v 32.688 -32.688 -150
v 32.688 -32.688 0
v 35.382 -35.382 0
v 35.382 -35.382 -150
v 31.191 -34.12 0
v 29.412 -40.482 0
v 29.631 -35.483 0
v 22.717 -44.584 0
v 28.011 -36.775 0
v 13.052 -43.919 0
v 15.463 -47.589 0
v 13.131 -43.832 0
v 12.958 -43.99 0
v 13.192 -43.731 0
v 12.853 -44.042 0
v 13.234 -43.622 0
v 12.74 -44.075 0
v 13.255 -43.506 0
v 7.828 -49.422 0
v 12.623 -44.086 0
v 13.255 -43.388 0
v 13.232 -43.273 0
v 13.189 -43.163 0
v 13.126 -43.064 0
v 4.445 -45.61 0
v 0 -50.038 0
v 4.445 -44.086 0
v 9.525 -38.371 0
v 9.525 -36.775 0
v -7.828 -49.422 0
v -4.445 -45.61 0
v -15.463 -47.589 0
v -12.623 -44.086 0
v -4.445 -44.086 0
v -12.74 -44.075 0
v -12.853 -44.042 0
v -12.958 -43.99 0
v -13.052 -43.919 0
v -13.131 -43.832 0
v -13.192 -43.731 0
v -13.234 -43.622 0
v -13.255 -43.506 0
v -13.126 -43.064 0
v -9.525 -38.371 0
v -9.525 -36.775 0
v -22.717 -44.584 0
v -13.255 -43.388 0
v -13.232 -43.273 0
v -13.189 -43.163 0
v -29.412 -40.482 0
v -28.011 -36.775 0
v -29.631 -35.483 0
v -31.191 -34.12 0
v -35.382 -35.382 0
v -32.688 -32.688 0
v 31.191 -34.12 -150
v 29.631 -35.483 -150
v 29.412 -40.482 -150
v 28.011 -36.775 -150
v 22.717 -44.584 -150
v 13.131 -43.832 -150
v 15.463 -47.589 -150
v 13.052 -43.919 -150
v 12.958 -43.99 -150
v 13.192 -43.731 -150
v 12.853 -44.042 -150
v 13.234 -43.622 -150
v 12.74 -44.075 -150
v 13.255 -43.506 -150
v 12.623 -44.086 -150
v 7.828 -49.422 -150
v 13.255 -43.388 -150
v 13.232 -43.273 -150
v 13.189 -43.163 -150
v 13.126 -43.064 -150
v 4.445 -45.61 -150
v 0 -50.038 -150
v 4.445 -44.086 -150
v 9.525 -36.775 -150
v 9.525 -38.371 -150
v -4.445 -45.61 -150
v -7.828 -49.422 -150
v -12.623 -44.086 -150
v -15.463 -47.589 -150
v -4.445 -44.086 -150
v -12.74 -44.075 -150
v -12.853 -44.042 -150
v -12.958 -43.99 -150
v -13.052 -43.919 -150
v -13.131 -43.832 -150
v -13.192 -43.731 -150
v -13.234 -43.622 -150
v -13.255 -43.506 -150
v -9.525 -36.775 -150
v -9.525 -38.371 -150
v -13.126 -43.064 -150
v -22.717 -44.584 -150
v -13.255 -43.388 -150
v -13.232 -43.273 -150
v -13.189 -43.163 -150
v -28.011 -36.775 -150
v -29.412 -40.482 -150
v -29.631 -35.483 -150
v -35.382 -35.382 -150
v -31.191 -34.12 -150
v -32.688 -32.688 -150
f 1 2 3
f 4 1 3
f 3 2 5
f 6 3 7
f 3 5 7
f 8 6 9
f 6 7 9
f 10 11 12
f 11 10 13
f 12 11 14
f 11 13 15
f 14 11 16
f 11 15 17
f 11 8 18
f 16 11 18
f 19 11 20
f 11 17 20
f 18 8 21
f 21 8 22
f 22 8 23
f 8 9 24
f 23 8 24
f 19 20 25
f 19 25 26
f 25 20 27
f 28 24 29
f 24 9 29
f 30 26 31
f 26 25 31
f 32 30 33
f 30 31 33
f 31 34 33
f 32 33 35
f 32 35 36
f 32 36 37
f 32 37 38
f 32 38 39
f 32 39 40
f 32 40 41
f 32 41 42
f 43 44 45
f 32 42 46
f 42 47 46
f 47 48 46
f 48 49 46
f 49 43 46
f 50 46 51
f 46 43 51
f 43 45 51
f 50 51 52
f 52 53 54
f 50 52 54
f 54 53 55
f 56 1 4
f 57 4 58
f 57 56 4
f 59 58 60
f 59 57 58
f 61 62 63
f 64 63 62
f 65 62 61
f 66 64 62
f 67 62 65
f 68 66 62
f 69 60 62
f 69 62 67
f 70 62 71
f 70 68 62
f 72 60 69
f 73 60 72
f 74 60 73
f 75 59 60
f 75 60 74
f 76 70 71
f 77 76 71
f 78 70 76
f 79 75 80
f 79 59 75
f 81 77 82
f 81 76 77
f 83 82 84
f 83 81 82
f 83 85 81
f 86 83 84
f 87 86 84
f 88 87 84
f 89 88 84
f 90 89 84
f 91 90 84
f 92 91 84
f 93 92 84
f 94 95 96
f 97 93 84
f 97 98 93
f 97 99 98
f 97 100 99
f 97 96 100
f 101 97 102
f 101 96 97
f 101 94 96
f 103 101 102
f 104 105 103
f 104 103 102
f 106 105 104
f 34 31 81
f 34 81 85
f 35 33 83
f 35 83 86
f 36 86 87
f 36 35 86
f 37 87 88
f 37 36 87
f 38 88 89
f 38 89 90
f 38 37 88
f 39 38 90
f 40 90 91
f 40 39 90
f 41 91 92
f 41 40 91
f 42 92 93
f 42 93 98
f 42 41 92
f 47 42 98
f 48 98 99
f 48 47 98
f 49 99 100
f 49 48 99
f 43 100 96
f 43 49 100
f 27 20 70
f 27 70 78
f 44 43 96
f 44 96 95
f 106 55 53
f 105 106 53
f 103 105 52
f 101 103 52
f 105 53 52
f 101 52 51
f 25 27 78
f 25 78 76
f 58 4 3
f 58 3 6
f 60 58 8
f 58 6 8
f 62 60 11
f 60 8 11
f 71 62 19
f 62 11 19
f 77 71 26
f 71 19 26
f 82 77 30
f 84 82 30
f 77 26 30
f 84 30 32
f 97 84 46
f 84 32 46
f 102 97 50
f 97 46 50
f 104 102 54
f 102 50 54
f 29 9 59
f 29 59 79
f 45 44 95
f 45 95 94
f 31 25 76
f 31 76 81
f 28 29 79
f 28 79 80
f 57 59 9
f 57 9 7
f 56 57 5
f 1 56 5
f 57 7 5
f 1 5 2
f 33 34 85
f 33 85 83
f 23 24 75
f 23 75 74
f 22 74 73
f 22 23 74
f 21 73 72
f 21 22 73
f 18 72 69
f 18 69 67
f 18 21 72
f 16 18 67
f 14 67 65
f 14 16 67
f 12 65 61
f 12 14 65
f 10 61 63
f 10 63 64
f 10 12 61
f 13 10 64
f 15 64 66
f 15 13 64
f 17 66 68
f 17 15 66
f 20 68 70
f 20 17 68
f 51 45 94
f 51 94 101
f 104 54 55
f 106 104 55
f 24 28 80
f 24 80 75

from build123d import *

# Parameters (mm, degrees)
BOSS_EXTRUDE1_DEPTH = 150
BOSS_EXTRUDE2_DEPTH = 150


with BuildPart() as part:
    # Sketch1 → Boss-Extrude1 (new body)
    with BuildSketch(Plane.XY):
        with BuildLine():
            Line((32.688132281, -32.688132281), (35.382209117, -35.382209117))
            ThreePointArc((35.382209117, -35.382209117), (0, -50.038), (-35.382209117, -35.382209117))
            Line((-35.382209117, -35.382209117), (-32.688132281, -32.688132281))
            ThreePointArc((-32.688132281, -32.688132281), (0, -46.228), (32.688132281, -32.688132281))
        make_face()
    extrude(amount=-BOSS_EXTRUDE1_DEPTH)

    # Sketch2 → Boss-Extrude2 (add)
    with BuildSketch(Plane.XY):
        with BuildLine():
            Line((-9.525, -36.775), (-28.011200599, -36.775))
            ThreePointArc((-28.011200599, -36.775), (-14.781631913, -43.801042704), (0, -46.228))
            Line((0, -46.228), (0, -45.609510869))
            Line((0, -45.609510869), (-4.445, -45.609510869))
            Line((-4.445, -45.609510869), (-4.445, -44.085510869))
            Line((-4.445, -44.085510869), (-12.622621116, -44.085510869))
            ThreePointArc((-12.622621116, -44.085510869), (-13.192135307, -43.731364187), (-13.126400487, -43.063947362))
            Line((-13.126400487, -43.063947362), (-9.525, -38.370510869))
            Line((-9.525, -38.370510869), (-9.525, -36.775))
        make_face()
        with BuildLine():
            Line((0, -45.609510869), (0, -46.228))
            ThreePointArc((0, -46.228), (14.781631913, -43.801042704), (28.011200599, -36.775))
            Line((28.011200599, -36.775), (9.525, -36.775))
            Line((9.525, -36.775), (9.525, -38.370510869))
            Line((9.525, -38.370510869), (13.126400487, -43.063947362))
            ThreePointArc((13.126400487, -43.063947362), (13.192135307, -43.731364187), (12.622621116, -44.085510869))
            Line((12.622621116, -44.085510869), (4.445, -44.085510869))
            Line((4.445, -44.085510869), (4.445, -45.609510869))
            Line((4.445, -45.609510869), (0, -45.609510869))
        make_face()
    extrude(amount=-BOSS_EXTRUDE2_DEPTH)


solid = part.part
